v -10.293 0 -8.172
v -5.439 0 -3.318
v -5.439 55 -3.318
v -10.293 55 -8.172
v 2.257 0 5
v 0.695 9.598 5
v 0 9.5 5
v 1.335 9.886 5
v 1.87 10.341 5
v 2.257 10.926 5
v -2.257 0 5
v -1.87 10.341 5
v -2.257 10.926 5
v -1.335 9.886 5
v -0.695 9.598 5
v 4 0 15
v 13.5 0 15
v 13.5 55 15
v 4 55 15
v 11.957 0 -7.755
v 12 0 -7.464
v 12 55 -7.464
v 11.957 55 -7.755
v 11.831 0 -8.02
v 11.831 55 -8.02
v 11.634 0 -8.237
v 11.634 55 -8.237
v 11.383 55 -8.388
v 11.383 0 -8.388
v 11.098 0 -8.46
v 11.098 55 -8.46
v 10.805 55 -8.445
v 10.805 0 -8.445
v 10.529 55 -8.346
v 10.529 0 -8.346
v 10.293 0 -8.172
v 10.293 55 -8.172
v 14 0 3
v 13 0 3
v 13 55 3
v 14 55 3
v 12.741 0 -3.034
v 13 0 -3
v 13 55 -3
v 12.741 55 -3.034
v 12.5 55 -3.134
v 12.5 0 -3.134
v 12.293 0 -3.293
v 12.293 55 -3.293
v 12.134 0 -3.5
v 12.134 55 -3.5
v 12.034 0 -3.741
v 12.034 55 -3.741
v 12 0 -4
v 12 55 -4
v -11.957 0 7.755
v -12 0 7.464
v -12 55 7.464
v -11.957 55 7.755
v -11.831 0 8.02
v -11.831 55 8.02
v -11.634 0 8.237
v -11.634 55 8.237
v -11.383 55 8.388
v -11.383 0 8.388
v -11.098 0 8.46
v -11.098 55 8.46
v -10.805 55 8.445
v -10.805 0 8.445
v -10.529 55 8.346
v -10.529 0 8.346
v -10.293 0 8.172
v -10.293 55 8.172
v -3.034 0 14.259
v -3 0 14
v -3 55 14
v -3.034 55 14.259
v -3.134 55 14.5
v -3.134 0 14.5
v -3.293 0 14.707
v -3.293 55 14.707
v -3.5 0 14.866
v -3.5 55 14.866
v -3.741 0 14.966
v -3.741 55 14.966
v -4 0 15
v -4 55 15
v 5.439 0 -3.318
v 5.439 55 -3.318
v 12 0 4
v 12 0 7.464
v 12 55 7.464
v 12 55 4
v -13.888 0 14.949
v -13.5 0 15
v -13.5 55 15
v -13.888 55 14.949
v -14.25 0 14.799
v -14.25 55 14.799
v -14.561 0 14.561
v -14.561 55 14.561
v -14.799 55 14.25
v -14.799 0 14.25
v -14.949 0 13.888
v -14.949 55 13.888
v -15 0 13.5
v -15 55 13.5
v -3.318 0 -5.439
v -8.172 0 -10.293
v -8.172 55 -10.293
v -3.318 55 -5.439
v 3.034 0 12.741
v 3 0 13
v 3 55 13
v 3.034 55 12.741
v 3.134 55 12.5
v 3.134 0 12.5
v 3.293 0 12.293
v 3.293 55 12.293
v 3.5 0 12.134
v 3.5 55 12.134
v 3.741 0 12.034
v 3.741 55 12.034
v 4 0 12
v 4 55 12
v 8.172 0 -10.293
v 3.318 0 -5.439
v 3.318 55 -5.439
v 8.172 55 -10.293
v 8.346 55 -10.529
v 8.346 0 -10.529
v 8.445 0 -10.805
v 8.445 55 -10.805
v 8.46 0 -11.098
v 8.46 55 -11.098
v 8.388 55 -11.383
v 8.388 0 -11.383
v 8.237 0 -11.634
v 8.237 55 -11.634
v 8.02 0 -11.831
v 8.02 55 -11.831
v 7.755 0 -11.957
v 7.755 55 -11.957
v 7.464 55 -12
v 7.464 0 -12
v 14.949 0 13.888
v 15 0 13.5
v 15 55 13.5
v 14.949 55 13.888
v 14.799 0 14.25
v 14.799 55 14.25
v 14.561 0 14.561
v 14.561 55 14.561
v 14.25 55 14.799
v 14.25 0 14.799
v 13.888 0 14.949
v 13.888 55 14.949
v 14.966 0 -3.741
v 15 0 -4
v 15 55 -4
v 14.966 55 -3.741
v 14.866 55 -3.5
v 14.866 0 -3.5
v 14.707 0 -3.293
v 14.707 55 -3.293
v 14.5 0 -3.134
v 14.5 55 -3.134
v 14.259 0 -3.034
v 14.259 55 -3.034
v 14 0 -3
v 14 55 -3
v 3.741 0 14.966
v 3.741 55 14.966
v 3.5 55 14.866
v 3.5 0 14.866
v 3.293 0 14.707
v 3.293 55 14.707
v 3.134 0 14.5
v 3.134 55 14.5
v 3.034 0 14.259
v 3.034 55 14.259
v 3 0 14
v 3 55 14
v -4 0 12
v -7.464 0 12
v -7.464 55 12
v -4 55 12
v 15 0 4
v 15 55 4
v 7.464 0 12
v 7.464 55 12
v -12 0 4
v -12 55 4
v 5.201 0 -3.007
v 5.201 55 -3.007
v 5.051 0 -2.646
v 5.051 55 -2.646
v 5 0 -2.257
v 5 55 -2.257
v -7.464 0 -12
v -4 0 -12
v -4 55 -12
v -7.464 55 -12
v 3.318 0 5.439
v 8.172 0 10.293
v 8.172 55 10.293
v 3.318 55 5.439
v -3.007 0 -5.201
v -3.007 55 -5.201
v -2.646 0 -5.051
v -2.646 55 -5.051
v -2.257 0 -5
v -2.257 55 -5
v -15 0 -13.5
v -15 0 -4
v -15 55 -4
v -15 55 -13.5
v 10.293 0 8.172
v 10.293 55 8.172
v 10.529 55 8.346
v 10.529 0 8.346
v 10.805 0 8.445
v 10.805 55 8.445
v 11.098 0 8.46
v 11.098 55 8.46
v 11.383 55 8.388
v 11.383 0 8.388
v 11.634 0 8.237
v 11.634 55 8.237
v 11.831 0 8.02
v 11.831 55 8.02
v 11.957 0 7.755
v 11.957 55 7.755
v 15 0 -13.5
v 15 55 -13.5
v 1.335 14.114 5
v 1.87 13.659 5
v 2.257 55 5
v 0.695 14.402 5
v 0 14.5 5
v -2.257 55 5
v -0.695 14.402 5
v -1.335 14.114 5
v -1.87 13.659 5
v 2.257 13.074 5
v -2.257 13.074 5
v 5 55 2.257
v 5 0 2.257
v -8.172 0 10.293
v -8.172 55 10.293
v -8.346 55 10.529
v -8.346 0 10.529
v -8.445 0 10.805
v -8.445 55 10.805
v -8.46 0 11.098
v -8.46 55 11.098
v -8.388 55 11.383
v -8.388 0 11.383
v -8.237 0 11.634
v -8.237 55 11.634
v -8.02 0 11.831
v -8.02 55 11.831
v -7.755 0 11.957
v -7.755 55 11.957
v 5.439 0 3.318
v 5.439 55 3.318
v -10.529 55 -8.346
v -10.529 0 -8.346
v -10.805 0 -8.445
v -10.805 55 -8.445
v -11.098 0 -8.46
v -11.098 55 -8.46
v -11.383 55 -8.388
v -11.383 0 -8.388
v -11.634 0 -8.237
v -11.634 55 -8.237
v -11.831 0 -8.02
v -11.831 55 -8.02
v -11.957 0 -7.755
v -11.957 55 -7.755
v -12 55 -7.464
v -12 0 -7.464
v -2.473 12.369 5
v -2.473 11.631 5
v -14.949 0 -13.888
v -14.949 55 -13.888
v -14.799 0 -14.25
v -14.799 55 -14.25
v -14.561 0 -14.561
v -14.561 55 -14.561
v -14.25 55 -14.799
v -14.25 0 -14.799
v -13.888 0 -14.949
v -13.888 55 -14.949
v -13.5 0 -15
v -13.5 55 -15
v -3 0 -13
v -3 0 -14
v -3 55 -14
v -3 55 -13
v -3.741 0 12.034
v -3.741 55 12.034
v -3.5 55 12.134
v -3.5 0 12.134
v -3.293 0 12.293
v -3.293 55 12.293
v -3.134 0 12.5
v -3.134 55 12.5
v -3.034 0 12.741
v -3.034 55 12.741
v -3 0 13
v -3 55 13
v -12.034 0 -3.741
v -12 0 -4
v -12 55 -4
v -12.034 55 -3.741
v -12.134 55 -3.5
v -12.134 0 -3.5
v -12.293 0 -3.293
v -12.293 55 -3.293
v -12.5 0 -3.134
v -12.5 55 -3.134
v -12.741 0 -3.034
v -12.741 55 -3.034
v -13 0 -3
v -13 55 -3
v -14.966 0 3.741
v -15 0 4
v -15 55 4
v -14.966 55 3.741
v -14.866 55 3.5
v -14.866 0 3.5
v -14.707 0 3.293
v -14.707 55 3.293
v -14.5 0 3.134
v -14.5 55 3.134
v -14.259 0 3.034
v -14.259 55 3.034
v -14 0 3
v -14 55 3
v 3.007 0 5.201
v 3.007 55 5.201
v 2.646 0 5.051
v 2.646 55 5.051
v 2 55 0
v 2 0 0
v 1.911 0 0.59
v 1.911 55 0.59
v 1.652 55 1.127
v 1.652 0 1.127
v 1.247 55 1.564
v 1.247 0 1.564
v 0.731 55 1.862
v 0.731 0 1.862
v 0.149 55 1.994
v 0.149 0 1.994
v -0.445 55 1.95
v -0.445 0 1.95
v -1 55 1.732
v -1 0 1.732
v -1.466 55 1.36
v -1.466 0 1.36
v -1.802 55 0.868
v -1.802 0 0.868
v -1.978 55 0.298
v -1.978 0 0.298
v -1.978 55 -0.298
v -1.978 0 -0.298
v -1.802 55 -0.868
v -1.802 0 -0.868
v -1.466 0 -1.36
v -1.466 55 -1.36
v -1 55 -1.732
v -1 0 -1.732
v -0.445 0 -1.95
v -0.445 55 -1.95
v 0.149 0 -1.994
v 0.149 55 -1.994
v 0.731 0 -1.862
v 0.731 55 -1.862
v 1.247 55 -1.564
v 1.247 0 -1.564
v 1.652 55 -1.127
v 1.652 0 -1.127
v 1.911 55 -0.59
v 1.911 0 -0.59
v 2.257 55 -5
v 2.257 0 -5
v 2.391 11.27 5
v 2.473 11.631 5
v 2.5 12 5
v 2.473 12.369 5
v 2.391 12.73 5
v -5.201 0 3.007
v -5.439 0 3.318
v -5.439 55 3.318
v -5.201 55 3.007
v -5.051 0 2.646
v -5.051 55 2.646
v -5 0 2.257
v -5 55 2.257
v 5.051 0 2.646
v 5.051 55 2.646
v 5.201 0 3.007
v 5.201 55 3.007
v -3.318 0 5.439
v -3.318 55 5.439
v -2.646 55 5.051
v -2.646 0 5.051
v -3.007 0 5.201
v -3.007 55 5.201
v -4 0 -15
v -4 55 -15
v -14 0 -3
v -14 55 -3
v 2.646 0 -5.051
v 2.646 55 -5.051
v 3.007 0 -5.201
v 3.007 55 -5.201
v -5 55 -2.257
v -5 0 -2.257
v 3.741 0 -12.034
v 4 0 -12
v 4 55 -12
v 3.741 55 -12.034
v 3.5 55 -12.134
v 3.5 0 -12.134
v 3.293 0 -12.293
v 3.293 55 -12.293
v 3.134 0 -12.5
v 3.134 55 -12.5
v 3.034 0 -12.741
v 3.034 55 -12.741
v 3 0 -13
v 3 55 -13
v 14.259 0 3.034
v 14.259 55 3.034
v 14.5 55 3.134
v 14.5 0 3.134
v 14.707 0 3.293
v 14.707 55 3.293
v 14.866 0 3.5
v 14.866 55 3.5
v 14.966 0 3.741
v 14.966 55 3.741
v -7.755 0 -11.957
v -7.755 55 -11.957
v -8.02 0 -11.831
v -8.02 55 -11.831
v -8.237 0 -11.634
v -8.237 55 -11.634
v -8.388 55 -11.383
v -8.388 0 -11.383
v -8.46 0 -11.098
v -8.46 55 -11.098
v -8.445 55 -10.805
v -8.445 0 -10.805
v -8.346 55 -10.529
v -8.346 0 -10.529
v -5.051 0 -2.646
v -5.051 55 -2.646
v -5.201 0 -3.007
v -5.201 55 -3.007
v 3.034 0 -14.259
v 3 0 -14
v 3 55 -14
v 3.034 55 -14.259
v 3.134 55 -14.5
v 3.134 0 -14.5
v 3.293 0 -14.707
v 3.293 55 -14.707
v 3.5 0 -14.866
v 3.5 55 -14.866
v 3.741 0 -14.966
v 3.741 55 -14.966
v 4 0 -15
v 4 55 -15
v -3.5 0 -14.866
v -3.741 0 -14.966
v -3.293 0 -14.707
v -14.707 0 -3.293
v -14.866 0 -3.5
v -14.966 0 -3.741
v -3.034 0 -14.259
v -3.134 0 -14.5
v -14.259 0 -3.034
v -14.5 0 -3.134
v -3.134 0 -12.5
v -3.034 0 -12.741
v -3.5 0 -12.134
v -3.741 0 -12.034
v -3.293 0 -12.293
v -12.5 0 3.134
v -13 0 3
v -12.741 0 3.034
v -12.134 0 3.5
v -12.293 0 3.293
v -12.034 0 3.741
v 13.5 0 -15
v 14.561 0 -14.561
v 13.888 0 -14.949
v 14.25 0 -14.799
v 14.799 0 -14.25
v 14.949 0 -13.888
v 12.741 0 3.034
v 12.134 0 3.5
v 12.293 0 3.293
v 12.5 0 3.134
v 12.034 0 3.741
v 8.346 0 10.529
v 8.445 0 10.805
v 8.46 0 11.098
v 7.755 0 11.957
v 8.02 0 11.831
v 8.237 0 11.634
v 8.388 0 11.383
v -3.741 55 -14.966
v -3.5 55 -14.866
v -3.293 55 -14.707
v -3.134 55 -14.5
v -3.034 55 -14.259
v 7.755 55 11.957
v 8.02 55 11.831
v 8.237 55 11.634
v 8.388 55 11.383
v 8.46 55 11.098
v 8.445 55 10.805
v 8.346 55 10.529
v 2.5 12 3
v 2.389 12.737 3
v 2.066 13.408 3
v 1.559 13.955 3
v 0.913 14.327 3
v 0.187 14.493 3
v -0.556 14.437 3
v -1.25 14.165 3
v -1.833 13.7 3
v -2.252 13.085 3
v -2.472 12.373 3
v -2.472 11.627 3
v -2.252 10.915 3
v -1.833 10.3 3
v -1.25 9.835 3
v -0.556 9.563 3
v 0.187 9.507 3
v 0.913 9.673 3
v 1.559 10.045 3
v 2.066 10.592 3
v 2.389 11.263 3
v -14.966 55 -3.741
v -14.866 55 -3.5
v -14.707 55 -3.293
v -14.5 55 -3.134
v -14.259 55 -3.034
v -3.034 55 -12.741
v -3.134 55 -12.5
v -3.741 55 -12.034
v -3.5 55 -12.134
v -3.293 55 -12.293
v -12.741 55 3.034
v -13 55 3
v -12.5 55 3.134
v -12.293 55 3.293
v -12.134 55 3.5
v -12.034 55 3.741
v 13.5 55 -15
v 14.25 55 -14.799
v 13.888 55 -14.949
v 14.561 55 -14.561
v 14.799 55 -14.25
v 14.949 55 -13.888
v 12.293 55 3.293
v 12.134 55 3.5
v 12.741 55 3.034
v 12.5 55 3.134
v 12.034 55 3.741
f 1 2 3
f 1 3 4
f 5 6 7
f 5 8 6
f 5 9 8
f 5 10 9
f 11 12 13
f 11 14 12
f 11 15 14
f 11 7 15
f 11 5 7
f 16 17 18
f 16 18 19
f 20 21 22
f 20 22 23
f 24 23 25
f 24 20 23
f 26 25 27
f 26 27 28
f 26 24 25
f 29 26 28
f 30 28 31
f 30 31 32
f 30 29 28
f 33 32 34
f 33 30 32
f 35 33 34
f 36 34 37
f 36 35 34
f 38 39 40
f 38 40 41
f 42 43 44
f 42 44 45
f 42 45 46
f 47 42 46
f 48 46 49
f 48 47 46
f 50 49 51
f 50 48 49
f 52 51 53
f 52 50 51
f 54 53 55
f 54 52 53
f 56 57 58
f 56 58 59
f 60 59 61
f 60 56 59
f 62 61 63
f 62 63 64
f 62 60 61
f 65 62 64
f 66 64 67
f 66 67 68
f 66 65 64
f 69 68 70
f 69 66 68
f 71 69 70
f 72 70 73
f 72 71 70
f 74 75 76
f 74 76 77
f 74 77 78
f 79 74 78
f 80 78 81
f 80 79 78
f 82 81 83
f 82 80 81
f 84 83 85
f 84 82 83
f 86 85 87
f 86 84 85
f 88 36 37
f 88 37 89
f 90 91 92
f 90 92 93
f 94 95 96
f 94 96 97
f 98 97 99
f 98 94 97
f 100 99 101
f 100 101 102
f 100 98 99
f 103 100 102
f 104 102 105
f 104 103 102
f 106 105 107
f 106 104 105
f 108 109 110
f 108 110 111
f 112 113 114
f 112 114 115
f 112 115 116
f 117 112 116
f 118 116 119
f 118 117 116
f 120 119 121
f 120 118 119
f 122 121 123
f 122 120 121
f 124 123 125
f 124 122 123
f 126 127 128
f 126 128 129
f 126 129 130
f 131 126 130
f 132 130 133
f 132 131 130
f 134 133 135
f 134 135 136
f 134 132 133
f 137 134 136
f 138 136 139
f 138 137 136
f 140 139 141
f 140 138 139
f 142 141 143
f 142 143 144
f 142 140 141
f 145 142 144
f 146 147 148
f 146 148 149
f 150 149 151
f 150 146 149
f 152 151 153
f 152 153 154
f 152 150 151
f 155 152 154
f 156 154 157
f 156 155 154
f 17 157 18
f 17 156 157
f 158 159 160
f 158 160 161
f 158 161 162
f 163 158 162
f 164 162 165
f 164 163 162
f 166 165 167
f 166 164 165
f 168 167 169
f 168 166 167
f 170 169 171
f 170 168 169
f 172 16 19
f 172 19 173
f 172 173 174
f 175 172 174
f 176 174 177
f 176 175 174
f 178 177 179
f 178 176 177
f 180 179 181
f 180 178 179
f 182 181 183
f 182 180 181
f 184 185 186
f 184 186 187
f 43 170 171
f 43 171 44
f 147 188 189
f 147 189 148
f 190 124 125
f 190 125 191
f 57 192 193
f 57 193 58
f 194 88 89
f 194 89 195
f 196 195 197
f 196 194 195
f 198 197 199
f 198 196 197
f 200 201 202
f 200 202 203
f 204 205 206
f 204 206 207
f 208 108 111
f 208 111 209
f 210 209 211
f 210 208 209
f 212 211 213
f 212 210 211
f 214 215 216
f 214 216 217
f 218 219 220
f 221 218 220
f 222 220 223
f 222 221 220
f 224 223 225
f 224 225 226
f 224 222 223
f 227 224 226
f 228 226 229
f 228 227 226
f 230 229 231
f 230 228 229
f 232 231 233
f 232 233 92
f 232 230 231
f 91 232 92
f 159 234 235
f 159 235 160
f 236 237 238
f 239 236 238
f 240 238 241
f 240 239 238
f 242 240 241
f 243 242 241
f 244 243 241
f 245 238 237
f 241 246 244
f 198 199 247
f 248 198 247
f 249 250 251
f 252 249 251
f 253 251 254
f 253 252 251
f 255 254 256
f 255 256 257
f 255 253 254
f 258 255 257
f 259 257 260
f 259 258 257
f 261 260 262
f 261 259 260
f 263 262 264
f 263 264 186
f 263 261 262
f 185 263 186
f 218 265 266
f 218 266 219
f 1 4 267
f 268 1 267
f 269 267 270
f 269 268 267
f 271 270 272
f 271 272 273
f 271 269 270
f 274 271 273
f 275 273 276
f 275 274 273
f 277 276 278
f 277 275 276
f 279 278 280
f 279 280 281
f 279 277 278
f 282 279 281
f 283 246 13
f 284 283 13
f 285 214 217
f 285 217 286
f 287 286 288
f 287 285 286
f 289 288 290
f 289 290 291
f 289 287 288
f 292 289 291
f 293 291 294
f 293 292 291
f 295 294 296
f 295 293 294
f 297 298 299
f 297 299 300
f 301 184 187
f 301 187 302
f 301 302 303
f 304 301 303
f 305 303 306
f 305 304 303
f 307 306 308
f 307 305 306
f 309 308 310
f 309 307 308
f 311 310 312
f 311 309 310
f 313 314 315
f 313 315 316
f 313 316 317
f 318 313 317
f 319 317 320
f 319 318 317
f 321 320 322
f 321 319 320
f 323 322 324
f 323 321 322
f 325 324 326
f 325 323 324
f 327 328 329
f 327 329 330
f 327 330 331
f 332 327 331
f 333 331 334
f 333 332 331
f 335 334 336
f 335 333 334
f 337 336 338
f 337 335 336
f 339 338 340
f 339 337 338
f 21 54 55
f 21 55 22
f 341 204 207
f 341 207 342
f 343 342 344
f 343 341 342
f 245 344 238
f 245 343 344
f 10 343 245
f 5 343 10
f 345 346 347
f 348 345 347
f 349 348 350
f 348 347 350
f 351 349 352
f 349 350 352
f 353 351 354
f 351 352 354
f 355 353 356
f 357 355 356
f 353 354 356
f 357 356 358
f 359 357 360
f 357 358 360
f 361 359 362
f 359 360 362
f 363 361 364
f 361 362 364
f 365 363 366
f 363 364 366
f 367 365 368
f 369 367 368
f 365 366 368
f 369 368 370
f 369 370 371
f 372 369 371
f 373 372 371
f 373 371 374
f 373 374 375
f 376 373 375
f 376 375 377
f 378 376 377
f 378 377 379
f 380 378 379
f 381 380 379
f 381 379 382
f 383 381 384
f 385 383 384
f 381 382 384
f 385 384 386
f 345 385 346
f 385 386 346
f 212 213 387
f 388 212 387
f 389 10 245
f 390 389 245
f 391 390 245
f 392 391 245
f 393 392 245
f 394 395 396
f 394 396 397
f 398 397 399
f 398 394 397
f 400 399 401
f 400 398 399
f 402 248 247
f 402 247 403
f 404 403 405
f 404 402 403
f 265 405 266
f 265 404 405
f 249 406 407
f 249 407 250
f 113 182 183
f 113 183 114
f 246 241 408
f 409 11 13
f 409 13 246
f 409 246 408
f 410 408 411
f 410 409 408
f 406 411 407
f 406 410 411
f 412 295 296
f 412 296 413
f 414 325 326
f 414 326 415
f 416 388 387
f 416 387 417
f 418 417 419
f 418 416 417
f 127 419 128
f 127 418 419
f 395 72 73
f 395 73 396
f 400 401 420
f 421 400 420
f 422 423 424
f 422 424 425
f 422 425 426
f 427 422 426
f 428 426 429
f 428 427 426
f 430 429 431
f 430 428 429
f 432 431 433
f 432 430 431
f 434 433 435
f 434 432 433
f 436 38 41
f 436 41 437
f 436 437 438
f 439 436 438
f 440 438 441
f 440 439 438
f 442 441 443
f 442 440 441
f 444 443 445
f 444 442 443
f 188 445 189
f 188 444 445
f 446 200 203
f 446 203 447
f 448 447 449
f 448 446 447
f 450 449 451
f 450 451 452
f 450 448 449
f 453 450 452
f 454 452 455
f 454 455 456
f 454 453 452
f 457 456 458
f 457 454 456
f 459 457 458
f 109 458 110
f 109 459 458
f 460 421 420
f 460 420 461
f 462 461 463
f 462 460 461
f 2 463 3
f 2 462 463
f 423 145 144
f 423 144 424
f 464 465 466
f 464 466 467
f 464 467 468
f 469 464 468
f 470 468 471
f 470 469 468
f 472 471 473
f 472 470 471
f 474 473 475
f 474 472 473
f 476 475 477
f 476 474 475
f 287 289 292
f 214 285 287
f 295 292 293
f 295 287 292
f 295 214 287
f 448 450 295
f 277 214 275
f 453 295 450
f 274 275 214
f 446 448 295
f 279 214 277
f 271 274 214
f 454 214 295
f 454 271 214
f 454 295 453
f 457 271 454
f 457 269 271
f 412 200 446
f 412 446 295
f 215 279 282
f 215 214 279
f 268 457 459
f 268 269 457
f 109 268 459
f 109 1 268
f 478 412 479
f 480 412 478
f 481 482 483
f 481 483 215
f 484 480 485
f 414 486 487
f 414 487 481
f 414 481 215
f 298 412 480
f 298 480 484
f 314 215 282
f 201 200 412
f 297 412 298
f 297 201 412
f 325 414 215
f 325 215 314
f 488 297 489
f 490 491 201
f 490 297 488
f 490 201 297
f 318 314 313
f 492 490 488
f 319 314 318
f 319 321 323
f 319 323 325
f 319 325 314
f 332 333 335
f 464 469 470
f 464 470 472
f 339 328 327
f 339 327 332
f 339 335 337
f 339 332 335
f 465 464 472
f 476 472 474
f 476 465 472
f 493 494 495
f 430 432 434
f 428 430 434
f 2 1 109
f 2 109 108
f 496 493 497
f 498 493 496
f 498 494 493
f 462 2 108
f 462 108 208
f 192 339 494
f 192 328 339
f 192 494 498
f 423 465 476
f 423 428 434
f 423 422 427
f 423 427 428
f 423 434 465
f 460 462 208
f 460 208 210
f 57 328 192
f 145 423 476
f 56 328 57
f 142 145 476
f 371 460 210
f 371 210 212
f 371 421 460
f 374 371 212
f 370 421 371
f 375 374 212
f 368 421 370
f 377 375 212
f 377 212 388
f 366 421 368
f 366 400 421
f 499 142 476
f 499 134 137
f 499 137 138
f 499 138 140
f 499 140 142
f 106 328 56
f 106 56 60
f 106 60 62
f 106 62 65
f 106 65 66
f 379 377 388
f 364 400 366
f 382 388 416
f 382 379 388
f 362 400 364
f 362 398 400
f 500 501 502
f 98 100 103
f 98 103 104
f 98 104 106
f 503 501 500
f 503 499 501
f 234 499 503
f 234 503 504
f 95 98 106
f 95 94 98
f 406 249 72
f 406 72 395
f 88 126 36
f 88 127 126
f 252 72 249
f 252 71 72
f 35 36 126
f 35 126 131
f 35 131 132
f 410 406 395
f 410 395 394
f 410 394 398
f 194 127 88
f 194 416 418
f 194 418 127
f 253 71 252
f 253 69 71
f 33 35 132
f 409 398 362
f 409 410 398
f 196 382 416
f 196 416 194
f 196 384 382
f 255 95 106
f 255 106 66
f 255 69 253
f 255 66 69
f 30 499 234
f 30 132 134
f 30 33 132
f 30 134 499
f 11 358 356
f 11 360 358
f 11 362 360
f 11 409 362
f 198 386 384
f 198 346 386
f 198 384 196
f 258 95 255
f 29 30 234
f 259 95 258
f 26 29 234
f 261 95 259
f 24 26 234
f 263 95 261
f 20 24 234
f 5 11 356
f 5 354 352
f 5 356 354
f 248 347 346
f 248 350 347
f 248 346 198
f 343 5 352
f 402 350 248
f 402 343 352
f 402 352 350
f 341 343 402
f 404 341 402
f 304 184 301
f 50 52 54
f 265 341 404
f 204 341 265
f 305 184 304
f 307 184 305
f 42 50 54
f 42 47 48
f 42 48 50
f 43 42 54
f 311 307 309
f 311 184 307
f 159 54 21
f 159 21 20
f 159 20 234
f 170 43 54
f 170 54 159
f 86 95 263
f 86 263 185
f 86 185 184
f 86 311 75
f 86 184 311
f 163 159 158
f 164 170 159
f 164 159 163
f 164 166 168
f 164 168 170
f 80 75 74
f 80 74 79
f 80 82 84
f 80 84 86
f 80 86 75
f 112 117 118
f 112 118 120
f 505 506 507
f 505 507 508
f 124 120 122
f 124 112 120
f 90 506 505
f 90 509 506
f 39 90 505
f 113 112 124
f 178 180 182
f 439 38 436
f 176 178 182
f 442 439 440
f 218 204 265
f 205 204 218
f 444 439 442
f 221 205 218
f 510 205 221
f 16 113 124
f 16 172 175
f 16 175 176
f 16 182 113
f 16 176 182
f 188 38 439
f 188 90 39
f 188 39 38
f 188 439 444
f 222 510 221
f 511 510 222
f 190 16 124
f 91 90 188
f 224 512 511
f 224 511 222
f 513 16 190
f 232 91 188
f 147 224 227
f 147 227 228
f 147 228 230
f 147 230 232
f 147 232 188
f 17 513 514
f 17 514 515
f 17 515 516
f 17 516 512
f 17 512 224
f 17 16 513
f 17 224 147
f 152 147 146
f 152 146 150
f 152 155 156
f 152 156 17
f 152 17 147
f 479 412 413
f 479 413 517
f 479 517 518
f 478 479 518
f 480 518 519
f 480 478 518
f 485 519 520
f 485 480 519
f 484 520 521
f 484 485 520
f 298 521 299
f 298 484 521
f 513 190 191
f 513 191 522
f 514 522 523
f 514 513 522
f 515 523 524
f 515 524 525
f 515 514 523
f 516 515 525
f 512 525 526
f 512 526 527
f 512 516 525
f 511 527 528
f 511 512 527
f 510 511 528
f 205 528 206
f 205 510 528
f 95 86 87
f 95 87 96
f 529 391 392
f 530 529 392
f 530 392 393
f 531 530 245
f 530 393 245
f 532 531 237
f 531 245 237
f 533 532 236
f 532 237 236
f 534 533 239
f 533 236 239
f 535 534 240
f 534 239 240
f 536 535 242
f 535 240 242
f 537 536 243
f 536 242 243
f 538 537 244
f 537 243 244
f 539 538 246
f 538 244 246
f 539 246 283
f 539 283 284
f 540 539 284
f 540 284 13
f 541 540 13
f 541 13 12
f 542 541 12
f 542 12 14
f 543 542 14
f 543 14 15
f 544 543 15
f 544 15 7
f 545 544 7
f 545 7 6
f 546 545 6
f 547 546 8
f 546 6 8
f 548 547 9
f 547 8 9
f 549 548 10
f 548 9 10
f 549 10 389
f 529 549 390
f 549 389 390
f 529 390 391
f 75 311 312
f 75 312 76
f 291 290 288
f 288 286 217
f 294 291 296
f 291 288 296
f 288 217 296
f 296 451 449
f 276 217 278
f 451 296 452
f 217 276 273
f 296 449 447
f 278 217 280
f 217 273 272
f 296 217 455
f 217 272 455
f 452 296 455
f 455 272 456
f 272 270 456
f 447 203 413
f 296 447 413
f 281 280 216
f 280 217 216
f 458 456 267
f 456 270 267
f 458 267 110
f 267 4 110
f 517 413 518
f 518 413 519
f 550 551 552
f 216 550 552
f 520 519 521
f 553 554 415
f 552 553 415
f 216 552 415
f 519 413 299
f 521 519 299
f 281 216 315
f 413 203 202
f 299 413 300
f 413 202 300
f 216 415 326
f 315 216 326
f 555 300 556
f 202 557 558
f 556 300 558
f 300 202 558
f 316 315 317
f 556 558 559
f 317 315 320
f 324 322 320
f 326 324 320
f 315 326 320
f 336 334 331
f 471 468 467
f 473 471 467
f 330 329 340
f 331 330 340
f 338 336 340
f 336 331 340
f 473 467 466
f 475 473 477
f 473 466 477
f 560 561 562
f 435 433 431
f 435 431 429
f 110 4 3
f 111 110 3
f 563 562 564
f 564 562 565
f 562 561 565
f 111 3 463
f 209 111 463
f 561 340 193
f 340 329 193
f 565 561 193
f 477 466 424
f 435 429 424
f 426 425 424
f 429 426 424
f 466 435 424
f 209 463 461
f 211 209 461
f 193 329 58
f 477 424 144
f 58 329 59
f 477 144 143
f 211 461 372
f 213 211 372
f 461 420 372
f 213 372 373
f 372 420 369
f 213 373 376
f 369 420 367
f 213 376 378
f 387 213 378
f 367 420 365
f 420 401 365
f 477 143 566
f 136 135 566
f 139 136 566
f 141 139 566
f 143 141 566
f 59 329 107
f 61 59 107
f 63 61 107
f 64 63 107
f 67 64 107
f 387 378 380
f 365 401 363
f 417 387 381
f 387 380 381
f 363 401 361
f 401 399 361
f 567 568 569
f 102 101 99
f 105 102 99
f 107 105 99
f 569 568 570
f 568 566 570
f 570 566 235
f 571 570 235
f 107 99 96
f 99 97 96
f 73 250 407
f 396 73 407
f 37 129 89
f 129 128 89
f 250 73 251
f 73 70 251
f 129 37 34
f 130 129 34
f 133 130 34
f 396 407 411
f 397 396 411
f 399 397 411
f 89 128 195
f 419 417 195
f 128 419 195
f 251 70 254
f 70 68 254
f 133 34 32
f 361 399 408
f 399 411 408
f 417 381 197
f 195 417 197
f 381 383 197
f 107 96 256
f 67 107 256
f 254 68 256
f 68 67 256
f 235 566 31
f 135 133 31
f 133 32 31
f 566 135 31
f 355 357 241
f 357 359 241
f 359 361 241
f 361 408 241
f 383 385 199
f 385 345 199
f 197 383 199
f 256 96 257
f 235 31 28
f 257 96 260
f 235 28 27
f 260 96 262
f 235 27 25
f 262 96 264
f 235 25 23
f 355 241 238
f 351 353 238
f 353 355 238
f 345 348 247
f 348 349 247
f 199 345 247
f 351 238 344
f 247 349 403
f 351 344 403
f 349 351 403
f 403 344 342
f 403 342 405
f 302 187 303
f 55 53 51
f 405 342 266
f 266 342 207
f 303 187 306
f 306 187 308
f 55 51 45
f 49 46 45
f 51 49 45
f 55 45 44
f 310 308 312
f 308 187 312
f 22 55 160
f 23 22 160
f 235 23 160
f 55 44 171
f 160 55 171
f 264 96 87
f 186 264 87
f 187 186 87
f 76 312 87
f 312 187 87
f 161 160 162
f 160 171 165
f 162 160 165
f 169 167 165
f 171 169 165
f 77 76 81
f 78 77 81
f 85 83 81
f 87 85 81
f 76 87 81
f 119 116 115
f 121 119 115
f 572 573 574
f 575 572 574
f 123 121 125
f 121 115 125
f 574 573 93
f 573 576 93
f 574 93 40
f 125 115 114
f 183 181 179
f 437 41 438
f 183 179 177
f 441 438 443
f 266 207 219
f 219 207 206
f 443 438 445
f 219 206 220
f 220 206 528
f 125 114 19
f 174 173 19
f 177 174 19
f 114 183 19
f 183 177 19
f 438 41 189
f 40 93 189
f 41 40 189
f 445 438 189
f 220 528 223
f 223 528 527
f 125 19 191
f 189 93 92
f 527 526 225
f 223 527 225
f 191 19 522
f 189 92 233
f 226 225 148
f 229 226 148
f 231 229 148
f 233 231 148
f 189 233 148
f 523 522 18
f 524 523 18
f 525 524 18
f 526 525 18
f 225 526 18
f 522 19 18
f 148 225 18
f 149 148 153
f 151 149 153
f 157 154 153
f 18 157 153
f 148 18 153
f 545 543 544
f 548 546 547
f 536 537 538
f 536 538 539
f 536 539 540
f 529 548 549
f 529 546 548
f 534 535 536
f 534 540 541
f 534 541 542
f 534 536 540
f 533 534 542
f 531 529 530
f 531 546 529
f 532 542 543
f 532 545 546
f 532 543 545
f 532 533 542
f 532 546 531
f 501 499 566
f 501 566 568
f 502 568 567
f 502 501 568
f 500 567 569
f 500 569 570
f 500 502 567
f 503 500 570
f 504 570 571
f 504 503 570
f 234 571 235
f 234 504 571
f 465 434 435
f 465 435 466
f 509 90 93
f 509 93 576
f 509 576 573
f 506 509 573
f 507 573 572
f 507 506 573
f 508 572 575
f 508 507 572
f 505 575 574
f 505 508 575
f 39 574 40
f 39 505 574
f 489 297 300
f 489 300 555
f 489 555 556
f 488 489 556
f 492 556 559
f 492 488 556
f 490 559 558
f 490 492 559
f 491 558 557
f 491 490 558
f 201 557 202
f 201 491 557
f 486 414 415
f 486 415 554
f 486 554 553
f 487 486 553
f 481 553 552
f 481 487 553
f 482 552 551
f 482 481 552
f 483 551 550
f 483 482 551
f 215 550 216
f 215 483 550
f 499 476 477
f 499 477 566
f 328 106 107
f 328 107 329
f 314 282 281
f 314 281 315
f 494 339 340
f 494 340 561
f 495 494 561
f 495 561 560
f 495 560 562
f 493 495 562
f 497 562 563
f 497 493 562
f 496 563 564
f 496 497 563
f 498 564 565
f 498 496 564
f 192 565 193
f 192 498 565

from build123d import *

# Parameters (mm, degrees)
F0_R     = 2
F1_DEPTH = 55
F2_R     = 2.5
F3_DEPTH = 2


with BuildPart() as f1:
    # F0 (on Front) → F1 (new body)
    with BuildSketch(Plane.XZ):
        with BuildLine():
            ThreePointArc((15, 13.5), (14.56066, 14.56066), (13.5, 15))
            Line((13.5, 15), (4, 15))
            ThreePointArc((4, 15), (3.292893, 14.707107), (3, 14))
            Line((3, 14), (3, 13))
            ThreePointArc((3, 13), (3.292893, 12.292893), (4, 12))
            Line((4, 12), (7.464466, 12))
            ThreePointArc((7.464466, 12), (8.388346, 11.382683), (8.171573, 10.292893))
            Line((8.171573, 10.292893), (3.318019, 5.43934))
            ThreePointArc((3.318019, 5.43934), (2.831384, 5.114181), (2.257359, 5))
            Line((2.257359, 5), (-2.257359, 5))
            ThreePointArc((-2.257359, 5), (-2.831384, 5.114181), (-3.318019, 5.43934))
            Line((-3.318019, 5.43934), (-8.171573, 10.292893))
            ThreePointArc((-8.171573, 10.292893), (-8.388346, 11.382683), (-7.464466, 12))
            Line((-7.464466, 12), (-4, 12))
            ThreePointArc((-4, 12), (-3.292893, 12.292893), (-3, 13))
            Line((-3, 13), (-3, 14))
            ThreePointArc((-3, 14), (-3.292893, 14.707107), (-4, 15))
            Line((-4, 15), (-13.5, 15))
            ThreePointArc((-13.5, 15), (-14.56066, 14.56066), (-15, 13.5))
            Line((-15, 13.5), (-15, 4))
            ThreePointArc((-15, 4), (-14.707107, 3.292893), (-14, 3))
            Line((-14, 3), (-13, 3))
            ThreePointArc((-13, 3), (-12.292893, 3.292893), (-12, 4))
            Line((-12, 4), (-12, 7.464466))
            ThreePointArc((-12, 7.464466), (-11.382683, 8.388346), (-10.292893, 8.171573))
            Line((-10.292893, 8.171573), (-5.43934, 3.318019))
            ThreePointArc((-5.43934, 3.318019), (-5.114181, 2.831384), (-5, 2.257359))
            Line((-5, 2.257359), (-5, -2.257359))
            ThreePointArc((-5, -2.257359), (-5.114181, -2.831384), (-5.43934, -3.318019))
            Line((-5.43934, -3.318019), (-10.292893, -8.171573))
            ThreePointArc((-10.292893, -8.171573), (-11.382683, -8.388346), (-12, -7.464466))
            Line((-12, -7.464466), (-12, -4))
            ThreePointArc((-12, -4), (-12.292893, -3.292893), (-13, -3))
            Line((-13, -3), (-14, -3))
            ThreePointArc((-14, -3), (-14.707107, -3.292893), (-15, -4))
            Line((-15, -4), (-15, -13.5))
            ThreePointArc((-15, -13.5), (-14.56066, -14.56066), (-13.5, -15))
            Line((-13.5, -15), (-4, -15))
            ThreePointArc((-4, -15), (-3.292893, -14.707107), (-3, -14))
            Line((-3, -14), (-3, -13))
            ThreePointArc((-3, -13), (-3.292893, -12.292893), (-4, -12))
            Line((-4, -12), (-7.464466, -12))
            ThreePointArc((-7.464466, -12), (-8.388346, -11.382683), (-8.171573, -10.292893))
            Line((-8.171573, -10.292893), (-3.318019, -5.43934))
            ThreePointArc((-3.318019, -5.43934), (-2.831384, -5.114181), (-2.257359, -5))
            Line((-2.257359, -5), (2.257359, -5))
            ThreePointArc((2.257359, -5), (2.831384, -5.114181), (3.318019, -5.43934))
            Line((3.318019, -5.43934), (8.171573, -10.292893))
            ThreePointArc((8.171573, -10.292893), (8.388346, -11.382683), (7.464466, -12))
            Line((7.464466, -12), (4, -12))
            ThreePointArc((4, -12), (3.292893, -12.292893), (3, -13))
            Line((3, -13), (3, -14))
            ThreePointArc((3, -14), (3.292893, -14.707107), (4, -15))
            Line((4, -15), (13.5, -15))
            ThreePointArc((13.5, -15), (14.56066, -14.56066), (15, -13.5))
            Line((15, -13.5), (15, -4))
            ThreePointArc((15, -4), (14.707107, -3.292893), (14, -3))
            Line((14, -3), (13, -3))
            ThreePointArc((13, -3), (12.292893, -3.292893), (12, -4))
            Line((12, -4), (12, -7.464466))
            ThreePointArc((12, -7.464466), (11.382683, -8.388346), (10.292893, -8.171573))
            Line((10.292893, -8.171573), (5.43934, -3.318019))
            ThreePointArc((5.43934, -3.318019), (5.114181, -2.831384), (5, -2.257359))
            Line((5, -2.257359), (5, 2.257359))
            ThreePointArc((5, 2.257359), (5.114181, 2.831384), (5.43934, 3.318019))
            Line((5.43934, 3.318019), (10.292893, 8.171573))
            ThreePointArc((10.292893, 8.171573), (11.382683, 8.388346), (12, 7.464466))
            Line((12, 7.464466), (12, 4))
            ThreePointArc((12, 4), (12.292893, 3.292893), (13, 3))
            Line((13, 3), (14, 3))
            ThreePointArc((14, 3), (14.707107, 3.292893), (15, 4))
            Line((15, 4), (15, 13.5))
        make_face()
        Circle(F0_R, mode=Mode.SUBTRACT)
    extrude(amount=-F1_DEPTH)

    # F2 (on face) → F3 (cut)
    with BuildSketch(Plane.XY.offset(5)):
        with Locations((0, 12)):
            Circle(F2_R)
    extrude(amount=-F3_DEPTH, mode=Mode.SUBTRACT)


solid = f1.part
